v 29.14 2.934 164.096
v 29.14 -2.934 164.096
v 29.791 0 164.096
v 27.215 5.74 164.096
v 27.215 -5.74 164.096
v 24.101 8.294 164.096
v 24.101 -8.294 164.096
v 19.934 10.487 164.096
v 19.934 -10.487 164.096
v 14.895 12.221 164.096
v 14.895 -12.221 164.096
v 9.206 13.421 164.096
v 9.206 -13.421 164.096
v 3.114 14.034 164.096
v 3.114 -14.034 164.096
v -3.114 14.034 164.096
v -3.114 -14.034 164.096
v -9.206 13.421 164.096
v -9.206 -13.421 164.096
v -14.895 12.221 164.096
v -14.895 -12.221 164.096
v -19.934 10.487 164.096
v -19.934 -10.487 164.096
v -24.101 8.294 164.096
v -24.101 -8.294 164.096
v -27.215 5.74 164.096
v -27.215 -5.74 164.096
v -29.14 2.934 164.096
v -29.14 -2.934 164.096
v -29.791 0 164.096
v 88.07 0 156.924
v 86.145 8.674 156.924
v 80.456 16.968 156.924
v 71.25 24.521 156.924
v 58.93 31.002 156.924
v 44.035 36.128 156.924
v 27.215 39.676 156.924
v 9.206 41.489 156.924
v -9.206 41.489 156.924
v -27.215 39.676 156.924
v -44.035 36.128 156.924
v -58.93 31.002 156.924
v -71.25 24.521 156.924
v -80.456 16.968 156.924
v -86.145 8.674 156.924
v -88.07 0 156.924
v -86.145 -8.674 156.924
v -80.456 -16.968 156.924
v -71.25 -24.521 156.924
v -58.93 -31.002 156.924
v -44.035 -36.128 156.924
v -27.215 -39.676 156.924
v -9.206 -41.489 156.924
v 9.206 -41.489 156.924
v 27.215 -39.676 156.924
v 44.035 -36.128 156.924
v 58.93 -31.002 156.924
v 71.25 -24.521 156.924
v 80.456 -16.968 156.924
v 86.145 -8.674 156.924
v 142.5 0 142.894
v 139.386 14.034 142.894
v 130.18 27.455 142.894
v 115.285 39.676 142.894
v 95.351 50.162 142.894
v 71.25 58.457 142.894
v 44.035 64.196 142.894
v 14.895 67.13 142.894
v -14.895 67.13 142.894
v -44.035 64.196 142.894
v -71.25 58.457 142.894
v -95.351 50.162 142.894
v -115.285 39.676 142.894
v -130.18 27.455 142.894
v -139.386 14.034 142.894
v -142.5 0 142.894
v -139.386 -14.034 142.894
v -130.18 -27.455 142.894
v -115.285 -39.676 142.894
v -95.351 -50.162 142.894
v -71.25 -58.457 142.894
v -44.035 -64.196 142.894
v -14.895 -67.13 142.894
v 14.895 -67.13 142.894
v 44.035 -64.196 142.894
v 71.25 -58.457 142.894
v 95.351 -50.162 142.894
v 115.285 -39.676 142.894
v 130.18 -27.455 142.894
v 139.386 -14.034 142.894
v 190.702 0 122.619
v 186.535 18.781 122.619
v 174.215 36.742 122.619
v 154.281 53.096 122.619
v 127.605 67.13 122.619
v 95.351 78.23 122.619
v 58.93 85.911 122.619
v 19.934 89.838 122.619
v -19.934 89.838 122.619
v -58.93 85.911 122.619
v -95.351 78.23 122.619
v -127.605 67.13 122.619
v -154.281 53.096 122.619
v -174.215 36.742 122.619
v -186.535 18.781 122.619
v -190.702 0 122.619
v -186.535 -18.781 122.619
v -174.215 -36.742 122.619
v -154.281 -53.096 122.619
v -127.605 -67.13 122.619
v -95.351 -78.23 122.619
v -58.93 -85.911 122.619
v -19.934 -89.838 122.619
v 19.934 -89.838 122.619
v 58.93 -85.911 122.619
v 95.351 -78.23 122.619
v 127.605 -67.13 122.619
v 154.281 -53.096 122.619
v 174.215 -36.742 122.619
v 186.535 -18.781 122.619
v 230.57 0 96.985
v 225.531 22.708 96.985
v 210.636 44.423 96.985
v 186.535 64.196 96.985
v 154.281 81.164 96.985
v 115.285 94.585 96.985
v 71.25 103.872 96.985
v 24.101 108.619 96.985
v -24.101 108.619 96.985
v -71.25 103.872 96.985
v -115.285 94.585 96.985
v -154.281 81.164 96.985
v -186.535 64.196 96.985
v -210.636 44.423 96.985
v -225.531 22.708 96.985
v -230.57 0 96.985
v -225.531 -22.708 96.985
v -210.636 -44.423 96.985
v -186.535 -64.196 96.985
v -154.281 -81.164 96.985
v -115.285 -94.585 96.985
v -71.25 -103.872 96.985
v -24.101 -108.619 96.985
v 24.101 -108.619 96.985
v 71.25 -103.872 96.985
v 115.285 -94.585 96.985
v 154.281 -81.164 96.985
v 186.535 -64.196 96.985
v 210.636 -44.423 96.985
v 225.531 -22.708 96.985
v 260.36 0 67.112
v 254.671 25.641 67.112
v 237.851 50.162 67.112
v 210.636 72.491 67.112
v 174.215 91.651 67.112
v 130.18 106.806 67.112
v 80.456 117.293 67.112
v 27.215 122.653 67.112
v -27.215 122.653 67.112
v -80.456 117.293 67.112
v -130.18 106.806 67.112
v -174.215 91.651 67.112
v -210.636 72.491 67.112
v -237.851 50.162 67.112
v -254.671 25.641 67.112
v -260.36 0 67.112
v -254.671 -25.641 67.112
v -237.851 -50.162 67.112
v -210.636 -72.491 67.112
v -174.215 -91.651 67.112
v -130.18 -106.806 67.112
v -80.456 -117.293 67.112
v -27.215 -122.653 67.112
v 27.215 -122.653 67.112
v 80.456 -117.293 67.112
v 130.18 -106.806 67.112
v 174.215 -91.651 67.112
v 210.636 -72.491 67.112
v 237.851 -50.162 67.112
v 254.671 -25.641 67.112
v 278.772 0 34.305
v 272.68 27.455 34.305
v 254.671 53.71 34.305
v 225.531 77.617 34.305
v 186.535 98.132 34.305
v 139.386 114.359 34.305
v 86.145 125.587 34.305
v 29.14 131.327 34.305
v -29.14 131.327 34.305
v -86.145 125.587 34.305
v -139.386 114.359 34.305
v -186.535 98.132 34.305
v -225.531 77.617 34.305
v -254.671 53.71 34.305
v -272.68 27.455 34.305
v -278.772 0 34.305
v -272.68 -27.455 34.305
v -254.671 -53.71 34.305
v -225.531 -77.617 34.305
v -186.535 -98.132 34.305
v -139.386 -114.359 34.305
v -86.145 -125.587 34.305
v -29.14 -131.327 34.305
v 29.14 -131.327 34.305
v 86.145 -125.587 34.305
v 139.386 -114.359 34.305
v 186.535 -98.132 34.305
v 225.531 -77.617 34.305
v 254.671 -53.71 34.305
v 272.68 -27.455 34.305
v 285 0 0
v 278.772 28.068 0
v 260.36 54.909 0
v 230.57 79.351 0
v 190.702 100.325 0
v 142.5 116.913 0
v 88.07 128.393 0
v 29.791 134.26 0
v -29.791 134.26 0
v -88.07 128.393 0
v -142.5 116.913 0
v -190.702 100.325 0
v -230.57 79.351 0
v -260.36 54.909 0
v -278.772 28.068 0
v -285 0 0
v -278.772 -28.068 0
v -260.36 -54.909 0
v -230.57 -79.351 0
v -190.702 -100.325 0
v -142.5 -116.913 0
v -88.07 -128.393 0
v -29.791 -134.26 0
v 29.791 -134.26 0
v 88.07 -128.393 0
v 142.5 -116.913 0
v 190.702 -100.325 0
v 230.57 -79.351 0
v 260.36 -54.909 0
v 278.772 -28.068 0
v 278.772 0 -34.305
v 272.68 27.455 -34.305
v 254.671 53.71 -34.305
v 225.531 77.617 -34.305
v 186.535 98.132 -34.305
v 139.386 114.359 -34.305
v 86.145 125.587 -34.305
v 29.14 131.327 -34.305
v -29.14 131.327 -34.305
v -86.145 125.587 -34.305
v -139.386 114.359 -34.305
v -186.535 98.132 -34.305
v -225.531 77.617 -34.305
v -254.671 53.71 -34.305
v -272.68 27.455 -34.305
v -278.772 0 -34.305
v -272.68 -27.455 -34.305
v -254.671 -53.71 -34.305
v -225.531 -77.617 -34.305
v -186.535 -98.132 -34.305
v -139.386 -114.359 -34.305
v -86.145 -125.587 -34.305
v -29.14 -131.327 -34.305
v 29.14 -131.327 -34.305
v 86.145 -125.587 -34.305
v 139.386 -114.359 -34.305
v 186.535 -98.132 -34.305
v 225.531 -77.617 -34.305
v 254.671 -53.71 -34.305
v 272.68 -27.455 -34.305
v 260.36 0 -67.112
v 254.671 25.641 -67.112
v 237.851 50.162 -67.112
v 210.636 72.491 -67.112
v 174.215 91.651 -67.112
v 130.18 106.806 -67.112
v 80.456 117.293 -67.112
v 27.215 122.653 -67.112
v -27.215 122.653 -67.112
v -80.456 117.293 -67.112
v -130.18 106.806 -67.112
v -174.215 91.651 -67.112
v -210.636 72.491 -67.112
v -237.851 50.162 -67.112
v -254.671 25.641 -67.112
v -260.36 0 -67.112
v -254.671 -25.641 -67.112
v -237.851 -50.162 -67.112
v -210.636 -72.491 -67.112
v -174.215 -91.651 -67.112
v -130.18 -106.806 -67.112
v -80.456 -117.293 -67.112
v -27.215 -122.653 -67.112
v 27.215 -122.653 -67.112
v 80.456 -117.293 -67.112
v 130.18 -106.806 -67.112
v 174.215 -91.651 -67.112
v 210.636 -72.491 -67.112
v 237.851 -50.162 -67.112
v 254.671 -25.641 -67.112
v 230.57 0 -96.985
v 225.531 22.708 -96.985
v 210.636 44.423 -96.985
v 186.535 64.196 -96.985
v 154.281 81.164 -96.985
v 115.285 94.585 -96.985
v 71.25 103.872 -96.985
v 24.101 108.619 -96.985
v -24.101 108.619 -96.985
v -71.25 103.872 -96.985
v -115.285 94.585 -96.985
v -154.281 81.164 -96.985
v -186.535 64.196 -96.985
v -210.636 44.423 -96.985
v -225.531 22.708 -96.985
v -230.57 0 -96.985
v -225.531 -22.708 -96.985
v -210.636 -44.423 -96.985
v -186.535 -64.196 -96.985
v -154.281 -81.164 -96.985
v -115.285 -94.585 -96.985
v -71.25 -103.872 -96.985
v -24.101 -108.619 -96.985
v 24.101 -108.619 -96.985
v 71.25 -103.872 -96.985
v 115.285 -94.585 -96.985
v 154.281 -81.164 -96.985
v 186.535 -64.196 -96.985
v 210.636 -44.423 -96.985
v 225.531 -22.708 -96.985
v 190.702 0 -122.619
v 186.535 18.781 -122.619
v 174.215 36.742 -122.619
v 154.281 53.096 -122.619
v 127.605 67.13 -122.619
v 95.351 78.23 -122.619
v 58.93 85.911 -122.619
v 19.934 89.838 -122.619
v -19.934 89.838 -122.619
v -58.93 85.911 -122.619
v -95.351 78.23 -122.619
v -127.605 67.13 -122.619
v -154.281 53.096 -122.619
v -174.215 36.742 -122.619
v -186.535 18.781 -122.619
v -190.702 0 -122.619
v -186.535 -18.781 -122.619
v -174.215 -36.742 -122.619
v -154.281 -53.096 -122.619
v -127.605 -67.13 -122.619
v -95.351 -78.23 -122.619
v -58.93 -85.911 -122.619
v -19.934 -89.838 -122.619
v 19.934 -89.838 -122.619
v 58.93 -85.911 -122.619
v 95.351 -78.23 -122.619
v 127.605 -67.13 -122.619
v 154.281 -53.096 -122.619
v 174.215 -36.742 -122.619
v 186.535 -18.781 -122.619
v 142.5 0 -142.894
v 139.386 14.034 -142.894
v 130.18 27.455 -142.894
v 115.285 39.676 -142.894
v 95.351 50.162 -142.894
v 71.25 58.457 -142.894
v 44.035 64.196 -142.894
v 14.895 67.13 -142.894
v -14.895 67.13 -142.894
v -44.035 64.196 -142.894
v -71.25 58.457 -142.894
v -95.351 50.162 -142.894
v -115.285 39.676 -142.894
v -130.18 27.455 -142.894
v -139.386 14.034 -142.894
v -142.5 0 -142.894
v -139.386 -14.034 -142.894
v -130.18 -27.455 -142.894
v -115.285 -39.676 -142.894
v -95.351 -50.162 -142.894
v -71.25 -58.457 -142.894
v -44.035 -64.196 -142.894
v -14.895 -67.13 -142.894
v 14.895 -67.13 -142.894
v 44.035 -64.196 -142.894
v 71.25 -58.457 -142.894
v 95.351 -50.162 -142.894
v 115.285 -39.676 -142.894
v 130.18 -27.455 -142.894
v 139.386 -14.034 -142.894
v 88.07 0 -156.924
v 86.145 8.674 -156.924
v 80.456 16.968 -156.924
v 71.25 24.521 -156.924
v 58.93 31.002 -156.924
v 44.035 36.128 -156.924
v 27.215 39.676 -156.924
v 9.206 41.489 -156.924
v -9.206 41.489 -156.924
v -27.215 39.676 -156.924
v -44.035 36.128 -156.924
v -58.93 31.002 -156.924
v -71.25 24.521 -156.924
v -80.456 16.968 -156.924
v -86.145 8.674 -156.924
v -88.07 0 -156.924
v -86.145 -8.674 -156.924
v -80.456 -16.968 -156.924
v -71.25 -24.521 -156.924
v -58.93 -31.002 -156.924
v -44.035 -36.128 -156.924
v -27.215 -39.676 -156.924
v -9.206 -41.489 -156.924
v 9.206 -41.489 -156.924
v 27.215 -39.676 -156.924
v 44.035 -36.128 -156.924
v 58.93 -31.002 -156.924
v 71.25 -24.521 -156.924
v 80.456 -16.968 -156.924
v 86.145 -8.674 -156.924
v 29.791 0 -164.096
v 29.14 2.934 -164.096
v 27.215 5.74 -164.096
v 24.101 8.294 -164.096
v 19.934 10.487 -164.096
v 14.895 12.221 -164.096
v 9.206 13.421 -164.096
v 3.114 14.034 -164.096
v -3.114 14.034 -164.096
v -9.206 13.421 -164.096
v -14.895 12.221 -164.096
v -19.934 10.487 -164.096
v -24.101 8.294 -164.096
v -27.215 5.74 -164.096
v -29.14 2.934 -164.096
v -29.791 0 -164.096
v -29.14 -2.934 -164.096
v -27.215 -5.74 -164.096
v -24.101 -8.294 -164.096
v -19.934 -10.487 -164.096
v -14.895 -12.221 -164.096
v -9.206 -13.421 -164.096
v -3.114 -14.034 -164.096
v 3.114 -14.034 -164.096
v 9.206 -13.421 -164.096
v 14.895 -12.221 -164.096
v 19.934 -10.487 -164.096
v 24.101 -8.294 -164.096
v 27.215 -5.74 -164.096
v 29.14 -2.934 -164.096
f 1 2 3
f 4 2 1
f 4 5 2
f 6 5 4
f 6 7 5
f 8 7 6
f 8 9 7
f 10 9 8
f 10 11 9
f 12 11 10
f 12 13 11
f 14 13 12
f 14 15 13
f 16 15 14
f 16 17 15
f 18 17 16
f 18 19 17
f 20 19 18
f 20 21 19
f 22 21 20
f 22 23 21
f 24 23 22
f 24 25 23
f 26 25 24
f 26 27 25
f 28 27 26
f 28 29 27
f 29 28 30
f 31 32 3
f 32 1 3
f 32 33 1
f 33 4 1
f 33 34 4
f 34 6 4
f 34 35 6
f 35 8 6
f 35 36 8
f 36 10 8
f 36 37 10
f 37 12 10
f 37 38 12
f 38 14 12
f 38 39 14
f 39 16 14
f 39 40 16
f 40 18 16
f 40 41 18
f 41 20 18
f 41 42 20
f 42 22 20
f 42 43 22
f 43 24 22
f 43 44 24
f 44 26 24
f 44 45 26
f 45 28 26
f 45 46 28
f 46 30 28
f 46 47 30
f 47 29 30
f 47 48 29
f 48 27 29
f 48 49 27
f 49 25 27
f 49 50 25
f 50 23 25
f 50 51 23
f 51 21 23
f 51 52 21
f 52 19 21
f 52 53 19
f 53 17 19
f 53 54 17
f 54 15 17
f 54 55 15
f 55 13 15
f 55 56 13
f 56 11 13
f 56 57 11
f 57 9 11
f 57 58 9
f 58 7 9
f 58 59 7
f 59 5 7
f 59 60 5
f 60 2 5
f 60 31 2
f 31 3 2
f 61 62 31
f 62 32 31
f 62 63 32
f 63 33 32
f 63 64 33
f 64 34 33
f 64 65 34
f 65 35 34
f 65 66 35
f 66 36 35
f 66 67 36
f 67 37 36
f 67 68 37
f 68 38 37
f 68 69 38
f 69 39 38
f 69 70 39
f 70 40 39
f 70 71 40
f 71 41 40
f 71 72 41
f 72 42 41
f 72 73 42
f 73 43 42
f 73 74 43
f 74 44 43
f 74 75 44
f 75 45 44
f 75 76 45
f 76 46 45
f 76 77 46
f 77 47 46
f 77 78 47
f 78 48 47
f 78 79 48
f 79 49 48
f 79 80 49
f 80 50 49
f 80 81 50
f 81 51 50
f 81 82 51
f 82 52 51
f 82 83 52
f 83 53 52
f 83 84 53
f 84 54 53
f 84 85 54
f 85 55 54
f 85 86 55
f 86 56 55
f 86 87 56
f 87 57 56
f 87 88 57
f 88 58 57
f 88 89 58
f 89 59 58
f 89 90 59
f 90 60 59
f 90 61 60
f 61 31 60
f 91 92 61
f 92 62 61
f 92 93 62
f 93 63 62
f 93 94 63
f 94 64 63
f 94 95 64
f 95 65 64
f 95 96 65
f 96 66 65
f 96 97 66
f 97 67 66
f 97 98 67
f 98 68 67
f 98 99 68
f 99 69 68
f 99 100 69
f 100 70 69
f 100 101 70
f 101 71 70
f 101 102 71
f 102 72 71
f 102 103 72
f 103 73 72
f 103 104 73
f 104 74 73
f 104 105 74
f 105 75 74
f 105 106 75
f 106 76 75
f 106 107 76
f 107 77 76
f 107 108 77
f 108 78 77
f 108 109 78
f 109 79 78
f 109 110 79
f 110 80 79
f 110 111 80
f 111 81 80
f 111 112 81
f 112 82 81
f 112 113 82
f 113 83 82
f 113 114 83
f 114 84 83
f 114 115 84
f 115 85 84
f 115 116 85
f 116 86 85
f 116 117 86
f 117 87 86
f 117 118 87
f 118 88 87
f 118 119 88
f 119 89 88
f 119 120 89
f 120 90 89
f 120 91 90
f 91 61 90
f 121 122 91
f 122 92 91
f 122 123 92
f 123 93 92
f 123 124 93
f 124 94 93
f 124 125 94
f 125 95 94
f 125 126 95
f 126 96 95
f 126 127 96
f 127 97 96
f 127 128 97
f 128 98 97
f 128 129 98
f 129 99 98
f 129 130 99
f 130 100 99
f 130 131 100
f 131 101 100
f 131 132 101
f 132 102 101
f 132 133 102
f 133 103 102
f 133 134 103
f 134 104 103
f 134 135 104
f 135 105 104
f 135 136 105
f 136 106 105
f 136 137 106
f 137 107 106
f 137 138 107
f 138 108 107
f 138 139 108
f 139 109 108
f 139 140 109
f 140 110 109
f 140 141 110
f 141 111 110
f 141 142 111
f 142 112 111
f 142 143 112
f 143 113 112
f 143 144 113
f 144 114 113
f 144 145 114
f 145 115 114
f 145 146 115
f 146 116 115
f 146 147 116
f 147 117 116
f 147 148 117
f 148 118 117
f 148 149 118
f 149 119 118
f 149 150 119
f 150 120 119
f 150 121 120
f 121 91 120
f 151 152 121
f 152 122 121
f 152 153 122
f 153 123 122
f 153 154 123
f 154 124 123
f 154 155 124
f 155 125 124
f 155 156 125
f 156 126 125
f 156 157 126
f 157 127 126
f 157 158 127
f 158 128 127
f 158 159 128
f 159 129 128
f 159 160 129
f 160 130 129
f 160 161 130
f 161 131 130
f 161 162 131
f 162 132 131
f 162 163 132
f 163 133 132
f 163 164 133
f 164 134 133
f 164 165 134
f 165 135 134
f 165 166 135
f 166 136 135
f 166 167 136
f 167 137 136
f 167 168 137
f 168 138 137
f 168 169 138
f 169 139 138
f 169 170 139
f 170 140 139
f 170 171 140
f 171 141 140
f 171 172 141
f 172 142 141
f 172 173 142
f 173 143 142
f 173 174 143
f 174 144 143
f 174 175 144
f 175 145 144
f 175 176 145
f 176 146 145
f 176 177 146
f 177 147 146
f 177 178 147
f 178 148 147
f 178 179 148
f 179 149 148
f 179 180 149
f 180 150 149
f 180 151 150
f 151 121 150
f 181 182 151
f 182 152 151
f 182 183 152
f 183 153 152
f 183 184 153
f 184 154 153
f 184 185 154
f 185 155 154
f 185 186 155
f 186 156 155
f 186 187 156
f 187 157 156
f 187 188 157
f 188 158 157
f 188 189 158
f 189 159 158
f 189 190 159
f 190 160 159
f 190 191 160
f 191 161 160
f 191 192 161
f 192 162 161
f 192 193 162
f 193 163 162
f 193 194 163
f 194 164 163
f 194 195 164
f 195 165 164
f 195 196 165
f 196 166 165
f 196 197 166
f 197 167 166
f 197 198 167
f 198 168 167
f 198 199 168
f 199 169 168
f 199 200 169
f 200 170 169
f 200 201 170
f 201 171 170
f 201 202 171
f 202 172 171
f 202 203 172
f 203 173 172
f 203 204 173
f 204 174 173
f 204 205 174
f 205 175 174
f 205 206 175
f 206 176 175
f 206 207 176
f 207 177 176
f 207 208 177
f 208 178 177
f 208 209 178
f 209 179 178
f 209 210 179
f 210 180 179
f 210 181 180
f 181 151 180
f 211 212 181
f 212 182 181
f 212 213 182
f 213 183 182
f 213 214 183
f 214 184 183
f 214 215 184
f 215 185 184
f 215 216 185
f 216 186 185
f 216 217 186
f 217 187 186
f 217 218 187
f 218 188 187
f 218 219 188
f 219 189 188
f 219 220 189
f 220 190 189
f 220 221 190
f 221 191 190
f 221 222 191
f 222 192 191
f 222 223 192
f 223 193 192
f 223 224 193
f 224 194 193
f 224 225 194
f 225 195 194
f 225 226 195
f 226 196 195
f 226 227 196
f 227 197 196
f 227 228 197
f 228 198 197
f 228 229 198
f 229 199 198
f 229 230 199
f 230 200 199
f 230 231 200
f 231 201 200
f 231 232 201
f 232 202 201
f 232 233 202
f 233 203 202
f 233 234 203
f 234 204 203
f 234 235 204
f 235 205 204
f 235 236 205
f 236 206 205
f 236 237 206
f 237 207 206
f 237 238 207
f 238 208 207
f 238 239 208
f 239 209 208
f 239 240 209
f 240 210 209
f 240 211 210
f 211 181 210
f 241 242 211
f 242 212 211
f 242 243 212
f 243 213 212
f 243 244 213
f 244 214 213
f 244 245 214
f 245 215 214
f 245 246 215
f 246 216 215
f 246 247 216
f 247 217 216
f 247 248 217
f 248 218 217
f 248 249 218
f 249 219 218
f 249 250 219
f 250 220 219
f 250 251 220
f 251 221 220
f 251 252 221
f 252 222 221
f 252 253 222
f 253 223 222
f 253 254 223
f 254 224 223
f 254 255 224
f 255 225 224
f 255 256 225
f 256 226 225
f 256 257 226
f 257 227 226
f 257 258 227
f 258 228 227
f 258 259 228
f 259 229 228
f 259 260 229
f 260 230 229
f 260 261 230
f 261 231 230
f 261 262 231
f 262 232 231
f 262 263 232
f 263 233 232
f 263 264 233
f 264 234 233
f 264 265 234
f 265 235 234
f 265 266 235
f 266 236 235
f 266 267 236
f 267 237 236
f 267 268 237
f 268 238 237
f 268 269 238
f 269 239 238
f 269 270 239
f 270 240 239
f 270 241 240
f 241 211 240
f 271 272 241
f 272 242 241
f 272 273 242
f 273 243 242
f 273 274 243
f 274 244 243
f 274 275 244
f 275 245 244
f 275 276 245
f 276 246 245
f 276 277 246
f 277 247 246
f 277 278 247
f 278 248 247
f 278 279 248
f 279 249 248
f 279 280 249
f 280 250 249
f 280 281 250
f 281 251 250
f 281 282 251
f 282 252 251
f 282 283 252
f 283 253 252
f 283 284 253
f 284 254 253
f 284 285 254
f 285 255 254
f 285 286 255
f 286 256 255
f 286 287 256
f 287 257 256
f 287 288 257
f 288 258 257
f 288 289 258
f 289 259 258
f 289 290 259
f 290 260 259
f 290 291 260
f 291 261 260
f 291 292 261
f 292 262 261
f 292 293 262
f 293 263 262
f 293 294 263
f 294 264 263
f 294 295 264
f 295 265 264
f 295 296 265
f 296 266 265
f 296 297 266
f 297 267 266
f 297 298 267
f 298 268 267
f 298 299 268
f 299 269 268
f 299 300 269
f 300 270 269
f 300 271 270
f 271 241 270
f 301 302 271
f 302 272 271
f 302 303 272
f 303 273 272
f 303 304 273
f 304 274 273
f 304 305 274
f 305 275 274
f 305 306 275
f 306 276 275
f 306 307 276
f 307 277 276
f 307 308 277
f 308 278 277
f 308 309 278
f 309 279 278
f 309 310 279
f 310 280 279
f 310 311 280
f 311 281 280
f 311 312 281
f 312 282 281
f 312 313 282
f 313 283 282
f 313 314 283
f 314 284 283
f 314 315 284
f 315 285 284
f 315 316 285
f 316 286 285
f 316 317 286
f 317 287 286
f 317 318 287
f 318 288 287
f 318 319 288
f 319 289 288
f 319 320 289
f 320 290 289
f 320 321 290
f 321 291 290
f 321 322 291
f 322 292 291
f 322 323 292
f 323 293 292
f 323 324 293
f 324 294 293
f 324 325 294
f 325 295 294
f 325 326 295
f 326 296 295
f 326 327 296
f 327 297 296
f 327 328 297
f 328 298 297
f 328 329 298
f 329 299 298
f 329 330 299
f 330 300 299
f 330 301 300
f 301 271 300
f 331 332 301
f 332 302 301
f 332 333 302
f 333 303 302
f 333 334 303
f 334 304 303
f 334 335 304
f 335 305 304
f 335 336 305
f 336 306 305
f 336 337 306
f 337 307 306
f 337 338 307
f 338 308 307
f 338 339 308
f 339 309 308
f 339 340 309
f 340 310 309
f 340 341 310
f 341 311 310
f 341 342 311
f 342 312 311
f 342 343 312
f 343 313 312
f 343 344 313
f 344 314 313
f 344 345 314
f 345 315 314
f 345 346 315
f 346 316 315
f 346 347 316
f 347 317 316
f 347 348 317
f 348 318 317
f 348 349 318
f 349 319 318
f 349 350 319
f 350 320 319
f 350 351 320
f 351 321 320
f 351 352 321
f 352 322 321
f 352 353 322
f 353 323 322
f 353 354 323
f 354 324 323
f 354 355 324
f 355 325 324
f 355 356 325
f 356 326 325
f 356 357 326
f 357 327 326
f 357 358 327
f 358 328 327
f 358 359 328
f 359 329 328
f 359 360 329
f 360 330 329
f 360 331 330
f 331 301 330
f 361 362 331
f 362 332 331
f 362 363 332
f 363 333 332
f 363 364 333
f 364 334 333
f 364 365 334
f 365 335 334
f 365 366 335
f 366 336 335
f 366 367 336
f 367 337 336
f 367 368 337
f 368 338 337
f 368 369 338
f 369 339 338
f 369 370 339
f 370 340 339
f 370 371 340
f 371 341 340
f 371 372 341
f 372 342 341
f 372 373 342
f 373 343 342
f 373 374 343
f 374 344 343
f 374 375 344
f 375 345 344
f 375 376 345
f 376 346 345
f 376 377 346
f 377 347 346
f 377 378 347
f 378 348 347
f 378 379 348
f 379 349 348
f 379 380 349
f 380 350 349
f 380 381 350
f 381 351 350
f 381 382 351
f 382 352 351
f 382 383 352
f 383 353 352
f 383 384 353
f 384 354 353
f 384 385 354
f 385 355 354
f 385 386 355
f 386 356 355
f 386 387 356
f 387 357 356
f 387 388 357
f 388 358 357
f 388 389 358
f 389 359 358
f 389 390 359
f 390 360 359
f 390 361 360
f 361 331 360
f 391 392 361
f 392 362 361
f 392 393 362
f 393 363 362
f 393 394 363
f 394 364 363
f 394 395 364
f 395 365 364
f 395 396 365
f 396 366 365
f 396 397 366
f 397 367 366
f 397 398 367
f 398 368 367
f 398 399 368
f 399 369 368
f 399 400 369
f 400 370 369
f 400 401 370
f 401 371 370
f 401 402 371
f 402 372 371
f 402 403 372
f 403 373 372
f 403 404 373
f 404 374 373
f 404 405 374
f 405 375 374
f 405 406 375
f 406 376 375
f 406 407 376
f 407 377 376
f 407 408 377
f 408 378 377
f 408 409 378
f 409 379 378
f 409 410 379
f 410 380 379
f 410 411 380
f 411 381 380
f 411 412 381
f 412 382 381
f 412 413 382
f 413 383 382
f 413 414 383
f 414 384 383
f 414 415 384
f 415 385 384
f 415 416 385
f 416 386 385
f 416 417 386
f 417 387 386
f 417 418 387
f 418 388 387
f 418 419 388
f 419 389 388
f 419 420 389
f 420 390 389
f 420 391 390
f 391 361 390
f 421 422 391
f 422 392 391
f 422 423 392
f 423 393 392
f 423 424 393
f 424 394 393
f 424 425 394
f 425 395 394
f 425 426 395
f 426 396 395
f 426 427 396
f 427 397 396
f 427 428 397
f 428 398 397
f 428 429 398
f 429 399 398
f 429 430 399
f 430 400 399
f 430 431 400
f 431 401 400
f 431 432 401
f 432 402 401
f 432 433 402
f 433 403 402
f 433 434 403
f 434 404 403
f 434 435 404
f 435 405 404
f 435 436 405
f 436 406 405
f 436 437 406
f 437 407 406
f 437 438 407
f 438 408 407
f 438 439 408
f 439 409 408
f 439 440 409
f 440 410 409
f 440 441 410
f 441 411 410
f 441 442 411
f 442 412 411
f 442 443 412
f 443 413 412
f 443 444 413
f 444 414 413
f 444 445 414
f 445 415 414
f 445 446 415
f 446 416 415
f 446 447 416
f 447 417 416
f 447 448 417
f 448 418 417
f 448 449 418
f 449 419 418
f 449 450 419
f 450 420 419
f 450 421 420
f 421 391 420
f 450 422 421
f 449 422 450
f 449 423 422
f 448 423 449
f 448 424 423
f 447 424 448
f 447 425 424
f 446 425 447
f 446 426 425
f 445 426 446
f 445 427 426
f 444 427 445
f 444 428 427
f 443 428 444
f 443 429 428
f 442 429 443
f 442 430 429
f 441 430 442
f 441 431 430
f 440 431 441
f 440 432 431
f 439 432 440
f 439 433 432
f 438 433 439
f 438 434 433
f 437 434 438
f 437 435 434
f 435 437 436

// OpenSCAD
// Generated by SolidPython 1.0.1 on 2020-07-29 00:46:54


scale(v = [19, 9, 11]) {
	sphere(r = 15);
}
/***********************************************
*********      SolidPython code:      **********
************************************************
 
# import packages: SolidPython
from solid import *
from solid.utils import *
from itertools import chain, combinations, permutations


class Resize:

    def __init__(self, scad_file):
        self.scad_file = scad_file
        #self.scad_file = import_scad(scad_file)
        # cone/cylinder param:
        self.r1 = 0
        self.r2 = 0
        self.h = 0
        # rectangular prism param:
        self.w = 0
        self.l = 0
        # ellipse param:
        self.r = 0

    # import OpenScad code (file name corresponds to shape)


    # classify shape + parameters
    def assign(self, param1, param2, param3):
        if self.scad_file == 'cone.scad':
            self.r1 = param1
            self.r2 = param2
            self.h = param3
        elif self.scad_file == 'cylinder.scad':
            self.r1 = param1
            self.r2 = param2
            self.h = param3
        elif self.scad_file == 'rectangularPrism.scad':
            self.h = param1
            self.l = param2
            self.w = param3
        else:
            self.r = param1
            self.h = param2

    # resize parameters
    def iterate(self):
        x = range(3, 20, 2)
        i = 1
        if self.scad_file == 'cone.scad':
            tempList = list(permutations(x, 2))
            for temp in tempList:
                param1 = temp[0]
                param2 = temp[1]
                filepath = 'produced_scad_files/' + 'cone' + str(param1) + '_' + str(param2) + '_' + '.scad'
                scad_render_to_file(cylinder(h=param1, r1=param2, r2=0), filepath)

        elif self.scad_file == 'cylinder.scad':
            tempList = list(permutations(x, 3))
            for temp in tempList:
                param1 = temp[0]
                param2 = temp[1]
                filepath = 'produced_scad_files/' + 'cylinder' + str(param1) + '_' + str(param2) + '_' + '.scad'
                scad_render_to_file(cylinder(h=param1, r1=param2, r2=param2), filepath)

        elif self.scad_file == 'rectangularPrism.scad':
            tempList = list(permutations(x, 3))
            for temp in tempList:
                param1 = temp[0]
                param2 = temp[1]
                param3 = temp[2]
                filepath = 'produced_scad_files/' + 'rectangularPrism' + str(param1) + '_' + str(param2) + '_' + str(
                    param3) + '.scad'
                scad_render_to_file(cube(size=(param1, param2, param3)), filepath)

        elif self.scad_file == 'ellipse.scad':
            tempList = list(permutations(x, 4))
            for temp in tempList:
                param1 = temp[0]
                param2 = temp[1]
                param3 = temp[2]
                param4 = temp[3]
                filepath = 'produced_scad_files/' + 'ellipse' + str(param1) + '_' + str(param2) + '_' + str(param3) + '_' + str(param4) + '.scad'
                scad_render_to_file(scale([param1, param2, param3])(sphere(r=param4)), filepath)

    def render_to_scadfile(self):
        scad_render_to_file(scad, 'example.scad') 
 
************************************************/
